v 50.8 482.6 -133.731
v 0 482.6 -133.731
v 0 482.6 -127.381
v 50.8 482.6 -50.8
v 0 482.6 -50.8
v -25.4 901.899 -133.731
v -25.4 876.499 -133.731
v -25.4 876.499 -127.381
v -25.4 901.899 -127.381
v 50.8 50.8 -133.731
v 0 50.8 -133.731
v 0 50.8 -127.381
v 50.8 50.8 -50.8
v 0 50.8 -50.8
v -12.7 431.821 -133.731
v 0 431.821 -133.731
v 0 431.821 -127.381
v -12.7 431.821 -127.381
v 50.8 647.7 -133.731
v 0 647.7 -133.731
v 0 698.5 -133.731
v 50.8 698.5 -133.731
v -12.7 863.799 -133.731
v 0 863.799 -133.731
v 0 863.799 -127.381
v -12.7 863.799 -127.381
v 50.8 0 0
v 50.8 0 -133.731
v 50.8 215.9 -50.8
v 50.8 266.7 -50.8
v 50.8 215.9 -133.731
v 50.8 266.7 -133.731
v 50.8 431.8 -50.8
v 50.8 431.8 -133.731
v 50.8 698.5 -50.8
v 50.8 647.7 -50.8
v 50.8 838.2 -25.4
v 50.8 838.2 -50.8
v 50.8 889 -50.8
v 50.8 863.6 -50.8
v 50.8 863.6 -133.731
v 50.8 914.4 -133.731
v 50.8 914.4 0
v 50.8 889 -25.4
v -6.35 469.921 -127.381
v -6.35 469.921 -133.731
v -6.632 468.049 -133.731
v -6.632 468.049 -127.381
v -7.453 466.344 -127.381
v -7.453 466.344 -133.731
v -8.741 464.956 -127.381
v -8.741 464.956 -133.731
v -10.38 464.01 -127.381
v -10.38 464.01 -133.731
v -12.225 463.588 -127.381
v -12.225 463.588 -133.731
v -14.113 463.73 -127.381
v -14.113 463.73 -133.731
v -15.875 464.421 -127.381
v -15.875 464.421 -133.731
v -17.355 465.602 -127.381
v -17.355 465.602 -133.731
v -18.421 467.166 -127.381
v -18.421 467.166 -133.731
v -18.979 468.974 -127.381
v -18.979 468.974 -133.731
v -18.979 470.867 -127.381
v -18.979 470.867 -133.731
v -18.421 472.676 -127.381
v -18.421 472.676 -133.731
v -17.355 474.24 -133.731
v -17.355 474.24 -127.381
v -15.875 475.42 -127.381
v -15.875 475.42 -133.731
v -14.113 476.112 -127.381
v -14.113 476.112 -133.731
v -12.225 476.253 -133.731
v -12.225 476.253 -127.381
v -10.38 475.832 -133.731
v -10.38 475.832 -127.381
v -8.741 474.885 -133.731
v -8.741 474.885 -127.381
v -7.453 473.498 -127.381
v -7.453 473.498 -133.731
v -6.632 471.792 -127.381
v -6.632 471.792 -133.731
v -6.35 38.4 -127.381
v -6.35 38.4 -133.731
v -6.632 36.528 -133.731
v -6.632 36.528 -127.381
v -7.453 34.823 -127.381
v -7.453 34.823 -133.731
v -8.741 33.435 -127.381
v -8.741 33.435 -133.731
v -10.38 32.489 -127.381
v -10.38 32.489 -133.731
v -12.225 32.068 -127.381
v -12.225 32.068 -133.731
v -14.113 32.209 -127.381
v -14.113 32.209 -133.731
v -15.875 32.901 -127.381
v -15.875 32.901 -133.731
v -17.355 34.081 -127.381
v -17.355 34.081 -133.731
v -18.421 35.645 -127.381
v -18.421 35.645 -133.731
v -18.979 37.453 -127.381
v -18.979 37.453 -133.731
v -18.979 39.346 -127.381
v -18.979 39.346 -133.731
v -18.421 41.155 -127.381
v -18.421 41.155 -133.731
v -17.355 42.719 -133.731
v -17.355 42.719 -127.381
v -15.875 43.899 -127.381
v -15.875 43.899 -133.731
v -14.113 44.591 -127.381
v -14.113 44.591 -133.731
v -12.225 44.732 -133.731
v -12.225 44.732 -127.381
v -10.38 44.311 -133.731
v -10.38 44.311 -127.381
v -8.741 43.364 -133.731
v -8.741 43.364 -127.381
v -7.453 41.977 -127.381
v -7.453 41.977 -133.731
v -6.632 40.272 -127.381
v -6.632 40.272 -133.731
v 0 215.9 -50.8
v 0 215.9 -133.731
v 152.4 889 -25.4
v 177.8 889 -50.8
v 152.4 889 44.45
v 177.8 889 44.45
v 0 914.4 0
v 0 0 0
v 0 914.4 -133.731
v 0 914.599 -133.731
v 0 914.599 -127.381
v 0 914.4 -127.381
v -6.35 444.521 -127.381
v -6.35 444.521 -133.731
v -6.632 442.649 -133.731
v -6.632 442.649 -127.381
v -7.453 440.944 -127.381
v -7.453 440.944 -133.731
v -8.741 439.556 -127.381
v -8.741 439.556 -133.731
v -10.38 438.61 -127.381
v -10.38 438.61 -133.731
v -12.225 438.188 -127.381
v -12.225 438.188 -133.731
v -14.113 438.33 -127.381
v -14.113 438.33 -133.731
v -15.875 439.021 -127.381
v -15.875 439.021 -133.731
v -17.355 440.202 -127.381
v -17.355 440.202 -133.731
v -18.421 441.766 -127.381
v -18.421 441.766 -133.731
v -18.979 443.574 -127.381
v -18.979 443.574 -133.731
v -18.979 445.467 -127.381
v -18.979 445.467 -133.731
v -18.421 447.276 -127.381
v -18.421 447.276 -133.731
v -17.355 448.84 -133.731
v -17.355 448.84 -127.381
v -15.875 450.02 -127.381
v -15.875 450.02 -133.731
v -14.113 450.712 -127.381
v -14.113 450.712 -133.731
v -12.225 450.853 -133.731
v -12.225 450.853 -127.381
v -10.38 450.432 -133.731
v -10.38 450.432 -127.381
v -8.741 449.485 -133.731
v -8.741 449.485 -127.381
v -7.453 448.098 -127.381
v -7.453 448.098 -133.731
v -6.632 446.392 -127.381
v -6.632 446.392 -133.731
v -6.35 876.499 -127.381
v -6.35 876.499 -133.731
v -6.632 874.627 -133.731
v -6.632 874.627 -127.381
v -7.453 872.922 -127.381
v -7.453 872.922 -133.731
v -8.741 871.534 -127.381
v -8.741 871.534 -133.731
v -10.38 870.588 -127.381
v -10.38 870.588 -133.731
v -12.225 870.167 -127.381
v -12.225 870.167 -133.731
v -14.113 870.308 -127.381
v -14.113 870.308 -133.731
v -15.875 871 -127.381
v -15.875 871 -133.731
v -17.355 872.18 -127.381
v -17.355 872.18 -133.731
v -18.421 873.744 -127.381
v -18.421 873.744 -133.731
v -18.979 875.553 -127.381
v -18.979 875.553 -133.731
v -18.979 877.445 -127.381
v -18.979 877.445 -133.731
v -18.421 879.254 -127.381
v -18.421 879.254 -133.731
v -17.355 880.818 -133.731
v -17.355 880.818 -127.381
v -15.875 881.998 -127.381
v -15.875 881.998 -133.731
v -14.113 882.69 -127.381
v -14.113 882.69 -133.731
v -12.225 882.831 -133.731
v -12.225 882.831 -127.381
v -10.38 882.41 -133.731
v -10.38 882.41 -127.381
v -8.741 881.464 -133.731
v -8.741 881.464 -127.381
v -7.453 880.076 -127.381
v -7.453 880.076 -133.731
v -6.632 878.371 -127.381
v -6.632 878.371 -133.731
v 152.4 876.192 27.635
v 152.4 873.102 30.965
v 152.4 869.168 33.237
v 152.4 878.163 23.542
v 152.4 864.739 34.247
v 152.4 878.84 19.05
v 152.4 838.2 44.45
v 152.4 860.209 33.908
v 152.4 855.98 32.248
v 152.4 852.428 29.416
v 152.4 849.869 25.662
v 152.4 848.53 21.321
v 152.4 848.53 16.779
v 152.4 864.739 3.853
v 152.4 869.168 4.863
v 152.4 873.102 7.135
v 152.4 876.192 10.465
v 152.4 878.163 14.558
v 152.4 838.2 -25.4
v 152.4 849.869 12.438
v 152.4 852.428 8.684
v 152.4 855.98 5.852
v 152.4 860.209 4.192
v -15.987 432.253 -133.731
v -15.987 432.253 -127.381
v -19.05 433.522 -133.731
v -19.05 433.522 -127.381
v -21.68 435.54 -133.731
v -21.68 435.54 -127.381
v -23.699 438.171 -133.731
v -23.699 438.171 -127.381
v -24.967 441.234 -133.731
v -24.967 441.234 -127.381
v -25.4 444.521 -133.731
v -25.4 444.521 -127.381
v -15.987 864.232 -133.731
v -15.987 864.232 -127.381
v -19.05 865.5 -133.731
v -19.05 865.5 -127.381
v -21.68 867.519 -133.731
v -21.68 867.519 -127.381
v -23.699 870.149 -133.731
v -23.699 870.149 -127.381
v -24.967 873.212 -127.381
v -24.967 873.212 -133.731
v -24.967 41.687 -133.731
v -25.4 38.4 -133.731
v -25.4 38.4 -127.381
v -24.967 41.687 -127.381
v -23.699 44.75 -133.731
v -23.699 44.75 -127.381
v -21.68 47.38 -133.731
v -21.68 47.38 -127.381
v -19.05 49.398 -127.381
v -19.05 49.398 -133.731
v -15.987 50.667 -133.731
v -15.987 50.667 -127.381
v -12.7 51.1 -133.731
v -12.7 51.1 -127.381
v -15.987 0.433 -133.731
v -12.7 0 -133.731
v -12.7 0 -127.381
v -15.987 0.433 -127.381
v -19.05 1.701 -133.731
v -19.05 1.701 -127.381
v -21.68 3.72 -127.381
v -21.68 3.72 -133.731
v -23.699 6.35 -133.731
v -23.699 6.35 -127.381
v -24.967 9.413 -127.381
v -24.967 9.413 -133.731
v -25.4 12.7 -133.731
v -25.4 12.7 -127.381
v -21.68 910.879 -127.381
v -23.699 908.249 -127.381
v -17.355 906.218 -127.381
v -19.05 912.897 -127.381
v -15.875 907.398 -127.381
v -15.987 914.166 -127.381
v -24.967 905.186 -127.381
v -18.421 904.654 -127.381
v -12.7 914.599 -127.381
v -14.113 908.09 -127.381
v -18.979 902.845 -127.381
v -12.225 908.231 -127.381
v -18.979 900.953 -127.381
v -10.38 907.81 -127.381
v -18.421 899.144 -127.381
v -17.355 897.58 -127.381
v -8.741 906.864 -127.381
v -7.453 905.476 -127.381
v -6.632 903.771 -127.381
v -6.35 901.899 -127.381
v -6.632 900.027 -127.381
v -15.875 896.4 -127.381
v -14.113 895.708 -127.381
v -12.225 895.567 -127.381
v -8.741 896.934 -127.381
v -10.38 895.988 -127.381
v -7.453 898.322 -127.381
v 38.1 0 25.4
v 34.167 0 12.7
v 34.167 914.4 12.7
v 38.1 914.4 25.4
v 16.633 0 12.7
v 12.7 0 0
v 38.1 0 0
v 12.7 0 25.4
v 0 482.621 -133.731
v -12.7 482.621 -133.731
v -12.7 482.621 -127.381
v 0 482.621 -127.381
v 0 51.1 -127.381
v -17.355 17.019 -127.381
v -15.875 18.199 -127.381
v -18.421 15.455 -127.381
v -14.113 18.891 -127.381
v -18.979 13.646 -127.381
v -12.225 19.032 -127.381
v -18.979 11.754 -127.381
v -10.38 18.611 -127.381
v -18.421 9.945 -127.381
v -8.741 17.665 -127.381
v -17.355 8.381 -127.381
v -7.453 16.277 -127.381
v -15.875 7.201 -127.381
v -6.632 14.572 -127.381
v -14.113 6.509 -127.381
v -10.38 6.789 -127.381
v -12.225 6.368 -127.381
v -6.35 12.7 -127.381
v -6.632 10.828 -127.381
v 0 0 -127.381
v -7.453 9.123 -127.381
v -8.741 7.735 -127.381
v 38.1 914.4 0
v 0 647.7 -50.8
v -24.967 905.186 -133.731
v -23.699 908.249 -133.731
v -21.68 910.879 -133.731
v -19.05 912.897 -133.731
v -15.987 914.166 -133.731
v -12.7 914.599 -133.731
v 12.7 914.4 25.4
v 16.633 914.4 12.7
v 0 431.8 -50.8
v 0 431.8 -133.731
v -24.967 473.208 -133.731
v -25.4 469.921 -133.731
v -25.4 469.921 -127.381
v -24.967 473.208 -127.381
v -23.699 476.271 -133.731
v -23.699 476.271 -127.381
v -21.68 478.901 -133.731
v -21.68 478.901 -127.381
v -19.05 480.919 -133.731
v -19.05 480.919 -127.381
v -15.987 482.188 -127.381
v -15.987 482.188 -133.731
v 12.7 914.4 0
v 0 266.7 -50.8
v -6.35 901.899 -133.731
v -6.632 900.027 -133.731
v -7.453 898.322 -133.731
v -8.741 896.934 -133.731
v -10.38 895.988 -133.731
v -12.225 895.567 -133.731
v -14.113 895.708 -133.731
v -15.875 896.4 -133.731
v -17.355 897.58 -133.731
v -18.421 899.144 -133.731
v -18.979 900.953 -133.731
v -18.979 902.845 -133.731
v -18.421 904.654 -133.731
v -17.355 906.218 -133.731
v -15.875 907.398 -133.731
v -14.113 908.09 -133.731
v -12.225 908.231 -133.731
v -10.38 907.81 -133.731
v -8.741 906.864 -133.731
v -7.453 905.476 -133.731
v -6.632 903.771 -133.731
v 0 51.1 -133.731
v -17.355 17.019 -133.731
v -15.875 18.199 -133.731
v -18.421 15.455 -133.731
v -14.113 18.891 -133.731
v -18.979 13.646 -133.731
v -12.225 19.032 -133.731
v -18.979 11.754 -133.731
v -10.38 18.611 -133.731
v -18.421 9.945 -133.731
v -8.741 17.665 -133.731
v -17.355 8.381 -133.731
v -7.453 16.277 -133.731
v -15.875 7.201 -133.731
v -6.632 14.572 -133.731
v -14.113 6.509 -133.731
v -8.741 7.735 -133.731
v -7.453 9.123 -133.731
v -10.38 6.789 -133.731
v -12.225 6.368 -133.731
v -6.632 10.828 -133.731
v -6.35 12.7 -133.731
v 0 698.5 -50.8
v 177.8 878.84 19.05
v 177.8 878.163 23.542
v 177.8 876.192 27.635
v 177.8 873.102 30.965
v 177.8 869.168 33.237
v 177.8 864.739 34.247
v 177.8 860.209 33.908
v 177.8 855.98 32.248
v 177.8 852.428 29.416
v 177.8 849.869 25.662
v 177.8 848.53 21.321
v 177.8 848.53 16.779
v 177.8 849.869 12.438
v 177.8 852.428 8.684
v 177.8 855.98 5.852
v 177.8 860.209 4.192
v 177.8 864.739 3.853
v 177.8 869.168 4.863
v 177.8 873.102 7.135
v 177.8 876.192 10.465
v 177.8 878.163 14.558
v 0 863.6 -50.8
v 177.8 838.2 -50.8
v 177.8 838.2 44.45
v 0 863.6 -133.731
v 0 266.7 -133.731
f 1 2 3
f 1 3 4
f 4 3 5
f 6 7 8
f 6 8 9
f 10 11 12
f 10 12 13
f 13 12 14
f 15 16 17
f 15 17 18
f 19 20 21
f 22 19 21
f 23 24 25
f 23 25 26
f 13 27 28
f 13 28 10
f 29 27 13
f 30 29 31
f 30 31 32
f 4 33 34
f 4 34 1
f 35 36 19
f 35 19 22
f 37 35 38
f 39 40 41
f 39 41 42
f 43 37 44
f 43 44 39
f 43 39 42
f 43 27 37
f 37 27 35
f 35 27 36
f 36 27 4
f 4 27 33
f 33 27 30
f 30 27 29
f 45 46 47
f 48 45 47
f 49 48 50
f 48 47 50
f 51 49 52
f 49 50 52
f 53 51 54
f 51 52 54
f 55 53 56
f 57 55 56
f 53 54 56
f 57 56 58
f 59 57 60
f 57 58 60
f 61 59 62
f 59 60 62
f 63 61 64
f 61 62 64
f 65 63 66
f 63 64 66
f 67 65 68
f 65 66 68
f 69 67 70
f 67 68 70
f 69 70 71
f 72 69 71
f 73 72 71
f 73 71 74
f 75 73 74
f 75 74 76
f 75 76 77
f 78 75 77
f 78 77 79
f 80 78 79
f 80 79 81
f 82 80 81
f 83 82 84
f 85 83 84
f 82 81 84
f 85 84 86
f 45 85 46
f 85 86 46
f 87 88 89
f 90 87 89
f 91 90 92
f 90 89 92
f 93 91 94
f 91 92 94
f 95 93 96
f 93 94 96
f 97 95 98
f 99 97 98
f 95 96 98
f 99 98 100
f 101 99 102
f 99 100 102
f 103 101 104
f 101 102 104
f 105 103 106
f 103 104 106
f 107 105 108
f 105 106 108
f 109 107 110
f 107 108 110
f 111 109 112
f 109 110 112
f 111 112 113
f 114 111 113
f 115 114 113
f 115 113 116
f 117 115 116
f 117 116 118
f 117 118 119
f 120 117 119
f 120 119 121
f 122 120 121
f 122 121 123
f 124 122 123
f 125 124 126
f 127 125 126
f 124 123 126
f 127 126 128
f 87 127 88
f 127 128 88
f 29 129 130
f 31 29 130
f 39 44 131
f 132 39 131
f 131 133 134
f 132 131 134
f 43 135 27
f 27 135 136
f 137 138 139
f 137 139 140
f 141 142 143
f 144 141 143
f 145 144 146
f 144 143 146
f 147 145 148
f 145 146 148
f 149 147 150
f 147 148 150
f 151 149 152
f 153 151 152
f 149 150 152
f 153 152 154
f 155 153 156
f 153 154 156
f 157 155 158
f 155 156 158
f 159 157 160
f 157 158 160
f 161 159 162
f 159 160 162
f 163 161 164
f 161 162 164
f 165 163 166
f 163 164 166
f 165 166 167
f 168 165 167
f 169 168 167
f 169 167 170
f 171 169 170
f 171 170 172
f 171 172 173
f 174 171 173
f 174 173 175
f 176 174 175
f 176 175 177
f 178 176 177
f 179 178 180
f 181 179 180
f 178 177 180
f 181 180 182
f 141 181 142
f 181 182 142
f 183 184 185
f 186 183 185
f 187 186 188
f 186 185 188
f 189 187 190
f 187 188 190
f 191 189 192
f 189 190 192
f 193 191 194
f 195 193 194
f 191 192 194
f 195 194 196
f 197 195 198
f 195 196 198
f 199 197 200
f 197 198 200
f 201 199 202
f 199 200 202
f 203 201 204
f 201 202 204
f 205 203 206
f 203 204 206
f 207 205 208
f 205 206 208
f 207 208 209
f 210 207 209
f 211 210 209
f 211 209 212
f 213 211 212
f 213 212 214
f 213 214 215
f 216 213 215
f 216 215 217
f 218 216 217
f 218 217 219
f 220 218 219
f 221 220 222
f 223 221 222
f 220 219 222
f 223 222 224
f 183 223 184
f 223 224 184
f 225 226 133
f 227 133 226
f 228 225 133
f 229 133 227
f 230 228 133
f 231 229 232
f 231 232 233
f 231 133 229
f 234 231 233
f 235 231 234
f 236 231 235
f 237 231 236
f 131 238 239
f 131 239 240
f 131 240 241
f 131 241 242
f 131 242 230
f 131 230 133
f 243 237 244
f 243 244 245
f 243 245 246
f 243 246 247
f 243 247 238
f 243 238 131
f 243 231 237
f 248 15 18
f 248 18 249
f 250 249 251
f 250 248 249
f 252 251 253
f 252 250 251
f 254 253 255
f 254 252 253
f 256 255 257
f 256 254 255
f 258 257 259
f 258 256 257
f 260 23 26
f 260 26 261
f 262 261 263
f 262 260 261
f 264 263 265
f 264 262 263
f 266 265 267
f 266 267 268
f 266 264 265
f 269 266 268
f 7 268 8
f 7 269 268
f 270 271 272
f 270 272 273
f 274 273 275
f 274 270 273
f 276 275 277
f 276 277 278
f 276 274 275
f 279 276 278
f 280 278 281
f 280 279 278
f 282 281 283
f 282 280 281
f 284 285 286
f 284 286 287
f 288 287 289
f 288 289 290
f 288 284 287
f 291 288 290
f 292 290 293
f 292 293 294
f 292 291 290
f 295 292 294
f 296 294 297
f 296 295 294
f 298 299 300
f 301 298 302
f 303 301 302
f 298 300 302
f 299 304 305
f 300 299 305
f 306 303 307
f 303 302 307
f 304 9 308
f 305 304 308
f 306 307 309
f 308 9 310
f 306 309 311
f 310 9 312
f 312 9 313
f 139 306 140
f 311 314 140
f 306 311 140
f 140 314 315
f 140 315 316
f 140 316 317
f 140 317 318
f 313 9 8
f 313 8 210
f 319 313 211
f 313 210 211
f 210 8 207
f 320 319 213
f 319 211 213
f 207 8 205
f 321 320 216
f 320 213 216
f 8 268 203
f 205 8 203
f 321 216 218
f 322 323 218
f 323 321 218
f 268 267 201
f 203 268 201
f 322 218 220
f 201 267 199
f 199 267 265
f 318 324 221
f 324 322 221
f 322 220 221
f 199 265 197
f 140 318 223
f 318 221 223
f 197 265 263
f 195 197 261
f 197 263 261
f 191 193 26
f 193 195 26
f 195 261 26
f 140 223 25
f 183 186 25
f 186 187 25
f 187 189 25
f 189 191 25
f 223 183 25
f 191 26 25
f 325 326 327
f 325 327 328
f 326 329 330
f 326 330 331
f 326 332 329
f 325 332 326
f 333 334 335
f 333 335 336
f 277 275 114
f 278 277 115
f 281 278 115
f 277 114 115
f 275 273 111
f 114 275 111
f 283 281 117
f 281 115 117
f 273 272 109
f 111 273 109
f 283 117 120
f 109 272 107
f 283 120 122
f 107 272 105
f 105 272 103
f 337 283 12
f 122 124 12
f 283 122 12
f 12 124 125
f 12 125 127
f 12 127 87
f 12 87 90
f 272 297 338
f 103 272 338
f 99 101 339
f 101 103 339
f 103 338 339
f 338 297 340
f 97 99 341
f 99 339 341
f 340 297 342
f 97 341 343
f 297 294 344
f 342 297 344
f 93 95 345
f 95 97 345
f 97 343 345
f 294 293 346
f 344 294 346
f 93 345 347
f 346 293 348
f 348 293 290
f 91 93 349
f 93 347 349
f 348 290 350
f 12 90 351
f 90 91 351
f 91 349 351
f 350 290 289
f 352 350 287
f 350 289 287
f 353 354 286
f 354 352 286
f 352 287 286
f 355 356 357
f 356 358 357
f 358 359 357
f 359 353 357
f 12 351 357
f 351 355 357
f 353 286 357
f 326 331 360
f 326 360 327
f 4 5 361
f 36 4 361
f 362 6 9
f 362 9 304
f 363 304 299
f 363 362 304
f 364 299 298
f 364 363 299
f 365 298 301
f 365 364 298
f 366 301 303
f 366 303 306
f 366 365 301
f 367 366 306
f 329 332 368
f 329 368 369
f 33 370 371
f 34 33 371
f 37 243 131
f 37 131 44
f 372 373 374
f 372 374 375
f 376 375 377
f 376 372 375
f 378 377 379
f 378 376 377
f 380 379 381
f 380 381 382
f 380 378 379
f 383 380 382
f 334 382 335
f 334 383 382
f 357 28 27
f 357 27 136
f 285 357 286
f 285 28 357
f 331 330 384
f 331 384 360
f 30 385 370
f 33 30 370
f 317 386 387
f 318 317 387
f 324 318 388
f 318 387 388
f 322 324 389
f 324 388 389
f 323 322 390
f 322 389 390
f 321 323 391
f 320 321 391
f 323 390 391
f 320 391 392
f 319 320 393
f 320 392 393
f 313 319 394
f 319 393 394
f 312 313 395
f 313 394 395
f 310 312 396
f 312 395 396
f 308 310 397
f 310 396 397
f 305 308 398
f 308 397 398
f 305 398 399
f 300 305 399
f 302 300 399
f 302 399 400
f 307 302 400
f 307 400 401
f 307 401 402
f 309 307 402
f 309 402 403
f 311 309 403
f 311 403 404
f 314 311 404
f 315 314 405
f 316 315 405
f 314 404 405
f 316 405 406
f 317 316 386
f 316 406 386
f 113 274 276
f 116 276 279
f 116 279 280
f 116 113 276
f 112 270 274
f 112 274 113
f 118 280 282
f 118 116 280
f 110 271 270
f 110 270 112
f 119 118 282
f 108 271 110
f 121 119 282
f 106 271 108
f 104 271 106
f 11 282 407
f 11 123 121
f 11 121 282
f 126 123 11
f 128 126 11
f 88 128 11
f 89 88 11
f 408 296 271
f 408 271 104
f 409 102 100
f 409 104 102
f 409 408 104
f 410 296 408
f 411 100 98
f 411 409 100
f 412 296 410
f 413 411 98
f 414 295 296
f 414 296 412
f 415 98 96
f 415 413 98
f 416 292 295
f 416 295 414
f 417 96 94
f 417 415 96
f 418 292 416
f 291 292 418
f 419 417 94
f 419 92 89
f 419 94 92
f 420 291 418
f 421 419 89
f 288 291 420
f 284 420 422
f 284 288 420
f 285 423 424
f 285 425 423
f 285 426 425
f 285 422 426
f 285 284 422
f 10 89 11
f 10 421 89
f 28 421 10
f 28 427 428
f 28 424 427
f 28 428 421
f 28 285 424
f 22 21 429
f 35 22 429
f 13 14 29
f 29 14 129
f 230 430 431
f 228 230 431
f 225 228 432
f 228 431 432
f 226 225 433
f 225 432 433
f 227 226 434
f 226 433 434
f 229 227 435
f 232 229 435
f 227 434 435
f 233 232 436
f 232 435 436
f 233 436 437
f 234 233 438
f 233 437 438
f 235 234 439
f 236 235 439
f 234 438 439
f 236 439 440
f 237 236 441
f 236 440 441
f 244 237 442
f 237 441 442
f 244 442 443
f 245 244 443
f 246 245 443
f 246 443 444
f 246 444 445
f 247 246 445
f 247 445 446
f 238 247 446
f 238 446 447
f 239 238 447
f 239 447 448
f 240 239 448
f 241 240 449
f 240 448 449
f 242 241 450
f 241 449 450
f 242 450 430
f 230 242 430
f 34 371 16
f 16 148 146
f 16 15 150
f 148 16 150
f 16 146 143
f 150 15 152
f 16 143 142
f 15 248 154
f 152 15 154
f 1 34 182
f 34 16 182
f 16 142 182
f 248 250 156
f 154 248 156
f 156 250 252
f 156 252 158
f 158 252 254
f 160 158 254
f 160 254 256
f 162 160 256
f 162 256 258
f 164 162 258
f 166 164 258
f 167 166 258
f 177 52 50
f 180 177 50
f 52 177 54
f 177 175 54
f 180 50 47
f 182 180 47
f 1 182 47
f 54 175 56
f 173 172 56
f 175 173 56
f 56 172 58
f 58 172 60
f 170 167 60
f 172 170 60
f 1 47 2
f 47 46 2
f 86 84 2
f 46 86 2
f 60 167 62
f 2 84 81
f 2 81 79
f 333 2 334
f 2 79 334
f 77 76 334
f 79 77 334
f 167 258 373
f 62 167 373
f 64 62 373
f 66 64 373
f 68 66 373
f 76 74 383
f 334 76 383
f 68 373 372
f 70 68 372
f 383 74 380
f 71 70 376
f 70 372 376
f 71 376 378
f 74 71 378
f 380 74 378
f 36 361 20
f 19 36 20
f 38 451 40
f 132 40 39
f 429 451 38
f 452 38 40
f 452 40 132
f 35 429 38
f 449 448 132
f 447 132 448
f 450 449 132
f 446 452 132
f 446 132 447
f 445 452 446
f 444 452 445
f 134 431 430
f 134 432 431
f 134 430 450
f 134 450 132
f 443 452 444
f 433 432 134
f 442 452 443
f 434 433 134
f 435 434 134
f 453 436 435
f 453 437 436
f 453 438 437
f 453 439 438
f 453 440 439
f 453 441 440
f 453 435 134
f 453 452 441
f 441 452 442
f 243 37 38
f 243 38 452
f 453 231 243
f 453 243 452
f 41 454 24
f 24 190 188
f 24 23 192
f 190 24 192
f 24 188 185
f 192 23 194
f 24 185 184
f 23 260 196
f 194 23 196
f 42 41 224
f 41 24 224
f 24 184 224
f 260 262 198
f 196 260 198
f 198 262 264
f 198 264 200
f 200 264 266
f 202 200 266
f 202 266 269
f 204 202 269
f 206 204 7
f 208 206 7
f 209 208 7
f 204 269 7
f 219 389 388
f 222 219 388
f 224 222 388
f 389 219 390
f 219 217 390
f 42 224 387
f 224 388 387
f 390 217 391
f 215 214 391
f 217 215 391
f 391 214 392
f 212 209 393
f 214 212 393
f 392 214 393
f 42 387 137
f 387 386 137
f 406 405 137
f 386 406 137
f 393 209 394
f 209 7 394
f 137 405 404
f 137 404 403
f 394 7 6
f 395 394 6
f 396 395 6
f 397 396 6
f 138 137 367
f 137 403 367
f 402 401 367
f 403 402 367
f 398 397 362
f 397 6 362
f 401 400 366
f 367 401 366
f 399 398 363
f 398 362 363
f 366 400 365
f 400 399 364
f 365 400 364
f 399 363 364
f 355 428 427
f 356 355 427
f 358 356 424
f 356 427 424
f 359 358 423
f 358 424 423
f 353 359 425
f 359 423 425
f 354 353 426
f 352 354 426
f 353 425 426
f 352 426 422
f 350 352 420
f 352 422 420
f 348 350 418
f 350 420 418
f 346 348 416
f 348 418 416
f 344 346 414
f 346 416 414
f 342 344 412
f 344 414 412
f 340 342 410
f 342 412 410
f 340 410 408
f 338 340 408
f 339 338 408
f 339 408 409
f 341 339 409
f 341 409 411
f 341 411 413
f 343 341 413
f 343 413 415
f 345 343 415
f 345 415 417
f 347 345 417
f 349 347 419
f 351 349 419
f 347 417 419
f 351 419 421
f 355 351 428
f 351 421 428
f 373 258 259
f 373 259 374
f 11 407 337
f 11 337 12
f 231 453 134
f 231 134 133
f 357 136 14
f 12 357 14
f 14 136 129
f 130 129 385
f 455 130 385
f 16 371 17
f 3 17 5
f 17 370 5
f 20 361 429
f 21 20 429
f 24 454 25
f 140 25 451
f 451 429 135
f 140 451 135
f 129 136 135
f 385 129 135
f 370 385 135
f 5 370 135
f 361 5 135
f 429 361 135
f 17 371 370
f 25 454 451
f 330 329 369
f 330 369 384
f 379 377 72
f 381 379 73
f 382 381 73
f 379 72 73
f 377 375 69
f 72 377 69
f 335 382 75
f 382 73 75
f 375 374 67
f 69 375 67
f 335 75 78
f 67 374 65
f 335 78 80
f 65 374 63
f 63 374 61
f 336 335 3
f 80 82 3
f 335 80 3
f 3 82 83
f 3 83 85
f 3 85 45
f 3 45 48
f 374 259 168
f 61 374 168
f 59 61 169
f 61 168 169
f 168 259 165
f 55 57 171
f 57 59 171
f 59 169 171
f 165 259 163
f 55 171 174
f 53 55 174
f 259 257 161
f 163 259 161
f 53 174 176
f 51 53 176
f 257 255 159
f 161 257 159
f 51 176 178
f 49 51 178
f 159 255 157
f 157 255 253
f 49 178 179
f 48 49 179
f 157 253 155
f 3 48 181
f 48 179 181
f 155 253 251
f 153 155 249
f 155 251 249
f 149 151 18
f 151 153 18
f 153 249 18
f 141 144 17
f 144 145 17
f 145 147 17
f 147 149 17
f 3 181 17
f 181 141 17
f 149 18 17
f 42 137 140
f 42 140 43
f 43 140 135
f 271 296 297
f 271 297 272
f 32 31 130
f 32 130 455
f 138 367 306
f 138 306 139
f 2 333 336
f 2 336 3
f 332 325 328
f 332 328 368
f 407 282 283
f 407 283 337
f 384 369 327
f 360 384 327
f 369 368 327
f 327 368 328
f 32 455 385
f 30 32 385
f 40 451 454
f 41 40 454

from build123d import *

# Parameters (mm, degrees)
F1_DEPTH  = 50.8
F3_DEPTH  = 914.4
F6_DEPTH  = 50.8
F8_R      = 6.35
F9_DEPTH  = 6.35
F11_R     = 15.24
F12_DEPTH = 25.4


with BuildPart() as f1:
    # F0 (on Right) → F1 (new body)
    with BuildSketch(Plane.YZ):
        Polygon((914.4, 0), (0, 0), (0, -133.731), (50.8, -133.731), (50.8, -50.8), (215.9, -50.8), (215.9, -133.731), (266.7, -133.731), (266.7, -50.8), (431.8, -50.8), (431.8, -133.731), (482.6, -133.731), (482.6, -50.8), (647.7, -50.8), (647.7, -133.731), (698.5, -133.731), (698.5, -50.8), (863.6, -50.8), (863.6, -133.731), (914.4, -133.731), align=None)
    extrude(amount=F1_DEPTH)

    # F5 (on offset) → F6 (join)
    with BuildSketch(Plane.XZ.offset(-838.2)):
        Polygon((152.4, 44.45), (152.4, -25.4), (0, -25.4), (0, -50.8), (177.8, -50.8), (177.8, 44.45), align=None)
    extrude(amount=-F6_DEPTH)

    # F8 (on offset) → F9 (join)
    with BuildSketch(Plane(origin=(0, 0, -133.731), x_dir=(1, 0, 0), z_dir=(0, 0, -1))):
        with BuildLine():
            Line((0, -51.0998591781), (0, 0))
            Line((0, 0), (-12.7, 0))
            ThreePointArc((-12.7, 0), (-21.6802561211, -3.7197438789), (-25.4, -12.7))
            Line((-25.4, -12.7), (-25.4, -38.3998591781))
            ThreePointArc((-25.4, -38.3998591781), (-21.6802561211, -47.3801152991), (-12.7, -51.0998591781))
            Line((-12.7, -51.0998591781), (0, -51.0998591781))
        make_face()
        with Locations((-12.7, -38.3998591781)):
            Circle(F8_R, mode=Mode.SUBTRACT)
        with Locations((-12.7, -12.7)):
            Circle(F8_R, mode=Mode.SUBTRACT)
        with BuildLine():
            Line((0, -914.598941803), (0, -863.798941803))
            Line((0, -863.798941803), (-12.7, -863.798941803))
            ThreePointArc((-12.7, -863.798941803), (-21.6802561211, -867.5186856819), (-25.4, -876.498941803))
            Line((-25.4, -876.498941803), (-25.4, -901.898941803))
            ThreePointArc((-25.4, -901.898941803), (-21.6802561211, -910.879197924), (-12.7, -914.598941803))
            Line((-12.7, -914.598941803), (0, -914.598941803))
        make_face()
        with Locations((-12.7, -901.898941803)):
            Circle(F8_R, mode=Mode.SUBTRACT)
        with Locations((-12.7, -876.498941803)):
            Circle(F8_R, mode=Mode.SUBTRACT)
        with BuildLine():
            Line((0, -482.620716095), (0, -431.820716095))
            Line((0, -431.820716095), (-12.7, -431.820716095))
            ThreePointArc((-12.7, -431.820716095), (-21.6802561211, -435.5404599739), (-25.4, -444.520716095))
            Line((-25.4, -444.520716095), (-25.4, -469.920716095))
            ThreePointArc((-25.4, -469.920716095), (-21.6802561211, -478.900972216), (-12.7, -482.620716095))
            Line((-12.7, -482.620716095), (0, -482.620716095))
        make_face()
        with Locations((-12.7, -469.920716095)):
            Circle(F8_R, mode=Mode.SUBTRACT)
        with Locations((-12.7, -444.520716095)):
            Circle(F8_R, mode=Mode.SUBTRACT)
    extrude(amount=-F9_DEPTH)

    # F11 (on offset) → F12 (cut)
    with BuildSketch(Plane.YZ.offset(177.8)):
        with Locations((863.6, 19.05)):
            Circle(F11_R)
    extrude(amount=-F12_DEPTH, mode=Mode.SUBTRACT)


with BuildPart() as f3:
    # F2 (on Front) → F3 (new body)
    with BuildSketch(Plane.XZ):
        Polygon((16.6332703084, 12.7), (12.7, 0), (38.1, 0), (34.1667296916, 12.7), (38.1, 25.4), (12.7, 25.4), align=None)
    extrude(amount=-F3_DEPTH)


solid = Compound([f1.part, f3.part])
